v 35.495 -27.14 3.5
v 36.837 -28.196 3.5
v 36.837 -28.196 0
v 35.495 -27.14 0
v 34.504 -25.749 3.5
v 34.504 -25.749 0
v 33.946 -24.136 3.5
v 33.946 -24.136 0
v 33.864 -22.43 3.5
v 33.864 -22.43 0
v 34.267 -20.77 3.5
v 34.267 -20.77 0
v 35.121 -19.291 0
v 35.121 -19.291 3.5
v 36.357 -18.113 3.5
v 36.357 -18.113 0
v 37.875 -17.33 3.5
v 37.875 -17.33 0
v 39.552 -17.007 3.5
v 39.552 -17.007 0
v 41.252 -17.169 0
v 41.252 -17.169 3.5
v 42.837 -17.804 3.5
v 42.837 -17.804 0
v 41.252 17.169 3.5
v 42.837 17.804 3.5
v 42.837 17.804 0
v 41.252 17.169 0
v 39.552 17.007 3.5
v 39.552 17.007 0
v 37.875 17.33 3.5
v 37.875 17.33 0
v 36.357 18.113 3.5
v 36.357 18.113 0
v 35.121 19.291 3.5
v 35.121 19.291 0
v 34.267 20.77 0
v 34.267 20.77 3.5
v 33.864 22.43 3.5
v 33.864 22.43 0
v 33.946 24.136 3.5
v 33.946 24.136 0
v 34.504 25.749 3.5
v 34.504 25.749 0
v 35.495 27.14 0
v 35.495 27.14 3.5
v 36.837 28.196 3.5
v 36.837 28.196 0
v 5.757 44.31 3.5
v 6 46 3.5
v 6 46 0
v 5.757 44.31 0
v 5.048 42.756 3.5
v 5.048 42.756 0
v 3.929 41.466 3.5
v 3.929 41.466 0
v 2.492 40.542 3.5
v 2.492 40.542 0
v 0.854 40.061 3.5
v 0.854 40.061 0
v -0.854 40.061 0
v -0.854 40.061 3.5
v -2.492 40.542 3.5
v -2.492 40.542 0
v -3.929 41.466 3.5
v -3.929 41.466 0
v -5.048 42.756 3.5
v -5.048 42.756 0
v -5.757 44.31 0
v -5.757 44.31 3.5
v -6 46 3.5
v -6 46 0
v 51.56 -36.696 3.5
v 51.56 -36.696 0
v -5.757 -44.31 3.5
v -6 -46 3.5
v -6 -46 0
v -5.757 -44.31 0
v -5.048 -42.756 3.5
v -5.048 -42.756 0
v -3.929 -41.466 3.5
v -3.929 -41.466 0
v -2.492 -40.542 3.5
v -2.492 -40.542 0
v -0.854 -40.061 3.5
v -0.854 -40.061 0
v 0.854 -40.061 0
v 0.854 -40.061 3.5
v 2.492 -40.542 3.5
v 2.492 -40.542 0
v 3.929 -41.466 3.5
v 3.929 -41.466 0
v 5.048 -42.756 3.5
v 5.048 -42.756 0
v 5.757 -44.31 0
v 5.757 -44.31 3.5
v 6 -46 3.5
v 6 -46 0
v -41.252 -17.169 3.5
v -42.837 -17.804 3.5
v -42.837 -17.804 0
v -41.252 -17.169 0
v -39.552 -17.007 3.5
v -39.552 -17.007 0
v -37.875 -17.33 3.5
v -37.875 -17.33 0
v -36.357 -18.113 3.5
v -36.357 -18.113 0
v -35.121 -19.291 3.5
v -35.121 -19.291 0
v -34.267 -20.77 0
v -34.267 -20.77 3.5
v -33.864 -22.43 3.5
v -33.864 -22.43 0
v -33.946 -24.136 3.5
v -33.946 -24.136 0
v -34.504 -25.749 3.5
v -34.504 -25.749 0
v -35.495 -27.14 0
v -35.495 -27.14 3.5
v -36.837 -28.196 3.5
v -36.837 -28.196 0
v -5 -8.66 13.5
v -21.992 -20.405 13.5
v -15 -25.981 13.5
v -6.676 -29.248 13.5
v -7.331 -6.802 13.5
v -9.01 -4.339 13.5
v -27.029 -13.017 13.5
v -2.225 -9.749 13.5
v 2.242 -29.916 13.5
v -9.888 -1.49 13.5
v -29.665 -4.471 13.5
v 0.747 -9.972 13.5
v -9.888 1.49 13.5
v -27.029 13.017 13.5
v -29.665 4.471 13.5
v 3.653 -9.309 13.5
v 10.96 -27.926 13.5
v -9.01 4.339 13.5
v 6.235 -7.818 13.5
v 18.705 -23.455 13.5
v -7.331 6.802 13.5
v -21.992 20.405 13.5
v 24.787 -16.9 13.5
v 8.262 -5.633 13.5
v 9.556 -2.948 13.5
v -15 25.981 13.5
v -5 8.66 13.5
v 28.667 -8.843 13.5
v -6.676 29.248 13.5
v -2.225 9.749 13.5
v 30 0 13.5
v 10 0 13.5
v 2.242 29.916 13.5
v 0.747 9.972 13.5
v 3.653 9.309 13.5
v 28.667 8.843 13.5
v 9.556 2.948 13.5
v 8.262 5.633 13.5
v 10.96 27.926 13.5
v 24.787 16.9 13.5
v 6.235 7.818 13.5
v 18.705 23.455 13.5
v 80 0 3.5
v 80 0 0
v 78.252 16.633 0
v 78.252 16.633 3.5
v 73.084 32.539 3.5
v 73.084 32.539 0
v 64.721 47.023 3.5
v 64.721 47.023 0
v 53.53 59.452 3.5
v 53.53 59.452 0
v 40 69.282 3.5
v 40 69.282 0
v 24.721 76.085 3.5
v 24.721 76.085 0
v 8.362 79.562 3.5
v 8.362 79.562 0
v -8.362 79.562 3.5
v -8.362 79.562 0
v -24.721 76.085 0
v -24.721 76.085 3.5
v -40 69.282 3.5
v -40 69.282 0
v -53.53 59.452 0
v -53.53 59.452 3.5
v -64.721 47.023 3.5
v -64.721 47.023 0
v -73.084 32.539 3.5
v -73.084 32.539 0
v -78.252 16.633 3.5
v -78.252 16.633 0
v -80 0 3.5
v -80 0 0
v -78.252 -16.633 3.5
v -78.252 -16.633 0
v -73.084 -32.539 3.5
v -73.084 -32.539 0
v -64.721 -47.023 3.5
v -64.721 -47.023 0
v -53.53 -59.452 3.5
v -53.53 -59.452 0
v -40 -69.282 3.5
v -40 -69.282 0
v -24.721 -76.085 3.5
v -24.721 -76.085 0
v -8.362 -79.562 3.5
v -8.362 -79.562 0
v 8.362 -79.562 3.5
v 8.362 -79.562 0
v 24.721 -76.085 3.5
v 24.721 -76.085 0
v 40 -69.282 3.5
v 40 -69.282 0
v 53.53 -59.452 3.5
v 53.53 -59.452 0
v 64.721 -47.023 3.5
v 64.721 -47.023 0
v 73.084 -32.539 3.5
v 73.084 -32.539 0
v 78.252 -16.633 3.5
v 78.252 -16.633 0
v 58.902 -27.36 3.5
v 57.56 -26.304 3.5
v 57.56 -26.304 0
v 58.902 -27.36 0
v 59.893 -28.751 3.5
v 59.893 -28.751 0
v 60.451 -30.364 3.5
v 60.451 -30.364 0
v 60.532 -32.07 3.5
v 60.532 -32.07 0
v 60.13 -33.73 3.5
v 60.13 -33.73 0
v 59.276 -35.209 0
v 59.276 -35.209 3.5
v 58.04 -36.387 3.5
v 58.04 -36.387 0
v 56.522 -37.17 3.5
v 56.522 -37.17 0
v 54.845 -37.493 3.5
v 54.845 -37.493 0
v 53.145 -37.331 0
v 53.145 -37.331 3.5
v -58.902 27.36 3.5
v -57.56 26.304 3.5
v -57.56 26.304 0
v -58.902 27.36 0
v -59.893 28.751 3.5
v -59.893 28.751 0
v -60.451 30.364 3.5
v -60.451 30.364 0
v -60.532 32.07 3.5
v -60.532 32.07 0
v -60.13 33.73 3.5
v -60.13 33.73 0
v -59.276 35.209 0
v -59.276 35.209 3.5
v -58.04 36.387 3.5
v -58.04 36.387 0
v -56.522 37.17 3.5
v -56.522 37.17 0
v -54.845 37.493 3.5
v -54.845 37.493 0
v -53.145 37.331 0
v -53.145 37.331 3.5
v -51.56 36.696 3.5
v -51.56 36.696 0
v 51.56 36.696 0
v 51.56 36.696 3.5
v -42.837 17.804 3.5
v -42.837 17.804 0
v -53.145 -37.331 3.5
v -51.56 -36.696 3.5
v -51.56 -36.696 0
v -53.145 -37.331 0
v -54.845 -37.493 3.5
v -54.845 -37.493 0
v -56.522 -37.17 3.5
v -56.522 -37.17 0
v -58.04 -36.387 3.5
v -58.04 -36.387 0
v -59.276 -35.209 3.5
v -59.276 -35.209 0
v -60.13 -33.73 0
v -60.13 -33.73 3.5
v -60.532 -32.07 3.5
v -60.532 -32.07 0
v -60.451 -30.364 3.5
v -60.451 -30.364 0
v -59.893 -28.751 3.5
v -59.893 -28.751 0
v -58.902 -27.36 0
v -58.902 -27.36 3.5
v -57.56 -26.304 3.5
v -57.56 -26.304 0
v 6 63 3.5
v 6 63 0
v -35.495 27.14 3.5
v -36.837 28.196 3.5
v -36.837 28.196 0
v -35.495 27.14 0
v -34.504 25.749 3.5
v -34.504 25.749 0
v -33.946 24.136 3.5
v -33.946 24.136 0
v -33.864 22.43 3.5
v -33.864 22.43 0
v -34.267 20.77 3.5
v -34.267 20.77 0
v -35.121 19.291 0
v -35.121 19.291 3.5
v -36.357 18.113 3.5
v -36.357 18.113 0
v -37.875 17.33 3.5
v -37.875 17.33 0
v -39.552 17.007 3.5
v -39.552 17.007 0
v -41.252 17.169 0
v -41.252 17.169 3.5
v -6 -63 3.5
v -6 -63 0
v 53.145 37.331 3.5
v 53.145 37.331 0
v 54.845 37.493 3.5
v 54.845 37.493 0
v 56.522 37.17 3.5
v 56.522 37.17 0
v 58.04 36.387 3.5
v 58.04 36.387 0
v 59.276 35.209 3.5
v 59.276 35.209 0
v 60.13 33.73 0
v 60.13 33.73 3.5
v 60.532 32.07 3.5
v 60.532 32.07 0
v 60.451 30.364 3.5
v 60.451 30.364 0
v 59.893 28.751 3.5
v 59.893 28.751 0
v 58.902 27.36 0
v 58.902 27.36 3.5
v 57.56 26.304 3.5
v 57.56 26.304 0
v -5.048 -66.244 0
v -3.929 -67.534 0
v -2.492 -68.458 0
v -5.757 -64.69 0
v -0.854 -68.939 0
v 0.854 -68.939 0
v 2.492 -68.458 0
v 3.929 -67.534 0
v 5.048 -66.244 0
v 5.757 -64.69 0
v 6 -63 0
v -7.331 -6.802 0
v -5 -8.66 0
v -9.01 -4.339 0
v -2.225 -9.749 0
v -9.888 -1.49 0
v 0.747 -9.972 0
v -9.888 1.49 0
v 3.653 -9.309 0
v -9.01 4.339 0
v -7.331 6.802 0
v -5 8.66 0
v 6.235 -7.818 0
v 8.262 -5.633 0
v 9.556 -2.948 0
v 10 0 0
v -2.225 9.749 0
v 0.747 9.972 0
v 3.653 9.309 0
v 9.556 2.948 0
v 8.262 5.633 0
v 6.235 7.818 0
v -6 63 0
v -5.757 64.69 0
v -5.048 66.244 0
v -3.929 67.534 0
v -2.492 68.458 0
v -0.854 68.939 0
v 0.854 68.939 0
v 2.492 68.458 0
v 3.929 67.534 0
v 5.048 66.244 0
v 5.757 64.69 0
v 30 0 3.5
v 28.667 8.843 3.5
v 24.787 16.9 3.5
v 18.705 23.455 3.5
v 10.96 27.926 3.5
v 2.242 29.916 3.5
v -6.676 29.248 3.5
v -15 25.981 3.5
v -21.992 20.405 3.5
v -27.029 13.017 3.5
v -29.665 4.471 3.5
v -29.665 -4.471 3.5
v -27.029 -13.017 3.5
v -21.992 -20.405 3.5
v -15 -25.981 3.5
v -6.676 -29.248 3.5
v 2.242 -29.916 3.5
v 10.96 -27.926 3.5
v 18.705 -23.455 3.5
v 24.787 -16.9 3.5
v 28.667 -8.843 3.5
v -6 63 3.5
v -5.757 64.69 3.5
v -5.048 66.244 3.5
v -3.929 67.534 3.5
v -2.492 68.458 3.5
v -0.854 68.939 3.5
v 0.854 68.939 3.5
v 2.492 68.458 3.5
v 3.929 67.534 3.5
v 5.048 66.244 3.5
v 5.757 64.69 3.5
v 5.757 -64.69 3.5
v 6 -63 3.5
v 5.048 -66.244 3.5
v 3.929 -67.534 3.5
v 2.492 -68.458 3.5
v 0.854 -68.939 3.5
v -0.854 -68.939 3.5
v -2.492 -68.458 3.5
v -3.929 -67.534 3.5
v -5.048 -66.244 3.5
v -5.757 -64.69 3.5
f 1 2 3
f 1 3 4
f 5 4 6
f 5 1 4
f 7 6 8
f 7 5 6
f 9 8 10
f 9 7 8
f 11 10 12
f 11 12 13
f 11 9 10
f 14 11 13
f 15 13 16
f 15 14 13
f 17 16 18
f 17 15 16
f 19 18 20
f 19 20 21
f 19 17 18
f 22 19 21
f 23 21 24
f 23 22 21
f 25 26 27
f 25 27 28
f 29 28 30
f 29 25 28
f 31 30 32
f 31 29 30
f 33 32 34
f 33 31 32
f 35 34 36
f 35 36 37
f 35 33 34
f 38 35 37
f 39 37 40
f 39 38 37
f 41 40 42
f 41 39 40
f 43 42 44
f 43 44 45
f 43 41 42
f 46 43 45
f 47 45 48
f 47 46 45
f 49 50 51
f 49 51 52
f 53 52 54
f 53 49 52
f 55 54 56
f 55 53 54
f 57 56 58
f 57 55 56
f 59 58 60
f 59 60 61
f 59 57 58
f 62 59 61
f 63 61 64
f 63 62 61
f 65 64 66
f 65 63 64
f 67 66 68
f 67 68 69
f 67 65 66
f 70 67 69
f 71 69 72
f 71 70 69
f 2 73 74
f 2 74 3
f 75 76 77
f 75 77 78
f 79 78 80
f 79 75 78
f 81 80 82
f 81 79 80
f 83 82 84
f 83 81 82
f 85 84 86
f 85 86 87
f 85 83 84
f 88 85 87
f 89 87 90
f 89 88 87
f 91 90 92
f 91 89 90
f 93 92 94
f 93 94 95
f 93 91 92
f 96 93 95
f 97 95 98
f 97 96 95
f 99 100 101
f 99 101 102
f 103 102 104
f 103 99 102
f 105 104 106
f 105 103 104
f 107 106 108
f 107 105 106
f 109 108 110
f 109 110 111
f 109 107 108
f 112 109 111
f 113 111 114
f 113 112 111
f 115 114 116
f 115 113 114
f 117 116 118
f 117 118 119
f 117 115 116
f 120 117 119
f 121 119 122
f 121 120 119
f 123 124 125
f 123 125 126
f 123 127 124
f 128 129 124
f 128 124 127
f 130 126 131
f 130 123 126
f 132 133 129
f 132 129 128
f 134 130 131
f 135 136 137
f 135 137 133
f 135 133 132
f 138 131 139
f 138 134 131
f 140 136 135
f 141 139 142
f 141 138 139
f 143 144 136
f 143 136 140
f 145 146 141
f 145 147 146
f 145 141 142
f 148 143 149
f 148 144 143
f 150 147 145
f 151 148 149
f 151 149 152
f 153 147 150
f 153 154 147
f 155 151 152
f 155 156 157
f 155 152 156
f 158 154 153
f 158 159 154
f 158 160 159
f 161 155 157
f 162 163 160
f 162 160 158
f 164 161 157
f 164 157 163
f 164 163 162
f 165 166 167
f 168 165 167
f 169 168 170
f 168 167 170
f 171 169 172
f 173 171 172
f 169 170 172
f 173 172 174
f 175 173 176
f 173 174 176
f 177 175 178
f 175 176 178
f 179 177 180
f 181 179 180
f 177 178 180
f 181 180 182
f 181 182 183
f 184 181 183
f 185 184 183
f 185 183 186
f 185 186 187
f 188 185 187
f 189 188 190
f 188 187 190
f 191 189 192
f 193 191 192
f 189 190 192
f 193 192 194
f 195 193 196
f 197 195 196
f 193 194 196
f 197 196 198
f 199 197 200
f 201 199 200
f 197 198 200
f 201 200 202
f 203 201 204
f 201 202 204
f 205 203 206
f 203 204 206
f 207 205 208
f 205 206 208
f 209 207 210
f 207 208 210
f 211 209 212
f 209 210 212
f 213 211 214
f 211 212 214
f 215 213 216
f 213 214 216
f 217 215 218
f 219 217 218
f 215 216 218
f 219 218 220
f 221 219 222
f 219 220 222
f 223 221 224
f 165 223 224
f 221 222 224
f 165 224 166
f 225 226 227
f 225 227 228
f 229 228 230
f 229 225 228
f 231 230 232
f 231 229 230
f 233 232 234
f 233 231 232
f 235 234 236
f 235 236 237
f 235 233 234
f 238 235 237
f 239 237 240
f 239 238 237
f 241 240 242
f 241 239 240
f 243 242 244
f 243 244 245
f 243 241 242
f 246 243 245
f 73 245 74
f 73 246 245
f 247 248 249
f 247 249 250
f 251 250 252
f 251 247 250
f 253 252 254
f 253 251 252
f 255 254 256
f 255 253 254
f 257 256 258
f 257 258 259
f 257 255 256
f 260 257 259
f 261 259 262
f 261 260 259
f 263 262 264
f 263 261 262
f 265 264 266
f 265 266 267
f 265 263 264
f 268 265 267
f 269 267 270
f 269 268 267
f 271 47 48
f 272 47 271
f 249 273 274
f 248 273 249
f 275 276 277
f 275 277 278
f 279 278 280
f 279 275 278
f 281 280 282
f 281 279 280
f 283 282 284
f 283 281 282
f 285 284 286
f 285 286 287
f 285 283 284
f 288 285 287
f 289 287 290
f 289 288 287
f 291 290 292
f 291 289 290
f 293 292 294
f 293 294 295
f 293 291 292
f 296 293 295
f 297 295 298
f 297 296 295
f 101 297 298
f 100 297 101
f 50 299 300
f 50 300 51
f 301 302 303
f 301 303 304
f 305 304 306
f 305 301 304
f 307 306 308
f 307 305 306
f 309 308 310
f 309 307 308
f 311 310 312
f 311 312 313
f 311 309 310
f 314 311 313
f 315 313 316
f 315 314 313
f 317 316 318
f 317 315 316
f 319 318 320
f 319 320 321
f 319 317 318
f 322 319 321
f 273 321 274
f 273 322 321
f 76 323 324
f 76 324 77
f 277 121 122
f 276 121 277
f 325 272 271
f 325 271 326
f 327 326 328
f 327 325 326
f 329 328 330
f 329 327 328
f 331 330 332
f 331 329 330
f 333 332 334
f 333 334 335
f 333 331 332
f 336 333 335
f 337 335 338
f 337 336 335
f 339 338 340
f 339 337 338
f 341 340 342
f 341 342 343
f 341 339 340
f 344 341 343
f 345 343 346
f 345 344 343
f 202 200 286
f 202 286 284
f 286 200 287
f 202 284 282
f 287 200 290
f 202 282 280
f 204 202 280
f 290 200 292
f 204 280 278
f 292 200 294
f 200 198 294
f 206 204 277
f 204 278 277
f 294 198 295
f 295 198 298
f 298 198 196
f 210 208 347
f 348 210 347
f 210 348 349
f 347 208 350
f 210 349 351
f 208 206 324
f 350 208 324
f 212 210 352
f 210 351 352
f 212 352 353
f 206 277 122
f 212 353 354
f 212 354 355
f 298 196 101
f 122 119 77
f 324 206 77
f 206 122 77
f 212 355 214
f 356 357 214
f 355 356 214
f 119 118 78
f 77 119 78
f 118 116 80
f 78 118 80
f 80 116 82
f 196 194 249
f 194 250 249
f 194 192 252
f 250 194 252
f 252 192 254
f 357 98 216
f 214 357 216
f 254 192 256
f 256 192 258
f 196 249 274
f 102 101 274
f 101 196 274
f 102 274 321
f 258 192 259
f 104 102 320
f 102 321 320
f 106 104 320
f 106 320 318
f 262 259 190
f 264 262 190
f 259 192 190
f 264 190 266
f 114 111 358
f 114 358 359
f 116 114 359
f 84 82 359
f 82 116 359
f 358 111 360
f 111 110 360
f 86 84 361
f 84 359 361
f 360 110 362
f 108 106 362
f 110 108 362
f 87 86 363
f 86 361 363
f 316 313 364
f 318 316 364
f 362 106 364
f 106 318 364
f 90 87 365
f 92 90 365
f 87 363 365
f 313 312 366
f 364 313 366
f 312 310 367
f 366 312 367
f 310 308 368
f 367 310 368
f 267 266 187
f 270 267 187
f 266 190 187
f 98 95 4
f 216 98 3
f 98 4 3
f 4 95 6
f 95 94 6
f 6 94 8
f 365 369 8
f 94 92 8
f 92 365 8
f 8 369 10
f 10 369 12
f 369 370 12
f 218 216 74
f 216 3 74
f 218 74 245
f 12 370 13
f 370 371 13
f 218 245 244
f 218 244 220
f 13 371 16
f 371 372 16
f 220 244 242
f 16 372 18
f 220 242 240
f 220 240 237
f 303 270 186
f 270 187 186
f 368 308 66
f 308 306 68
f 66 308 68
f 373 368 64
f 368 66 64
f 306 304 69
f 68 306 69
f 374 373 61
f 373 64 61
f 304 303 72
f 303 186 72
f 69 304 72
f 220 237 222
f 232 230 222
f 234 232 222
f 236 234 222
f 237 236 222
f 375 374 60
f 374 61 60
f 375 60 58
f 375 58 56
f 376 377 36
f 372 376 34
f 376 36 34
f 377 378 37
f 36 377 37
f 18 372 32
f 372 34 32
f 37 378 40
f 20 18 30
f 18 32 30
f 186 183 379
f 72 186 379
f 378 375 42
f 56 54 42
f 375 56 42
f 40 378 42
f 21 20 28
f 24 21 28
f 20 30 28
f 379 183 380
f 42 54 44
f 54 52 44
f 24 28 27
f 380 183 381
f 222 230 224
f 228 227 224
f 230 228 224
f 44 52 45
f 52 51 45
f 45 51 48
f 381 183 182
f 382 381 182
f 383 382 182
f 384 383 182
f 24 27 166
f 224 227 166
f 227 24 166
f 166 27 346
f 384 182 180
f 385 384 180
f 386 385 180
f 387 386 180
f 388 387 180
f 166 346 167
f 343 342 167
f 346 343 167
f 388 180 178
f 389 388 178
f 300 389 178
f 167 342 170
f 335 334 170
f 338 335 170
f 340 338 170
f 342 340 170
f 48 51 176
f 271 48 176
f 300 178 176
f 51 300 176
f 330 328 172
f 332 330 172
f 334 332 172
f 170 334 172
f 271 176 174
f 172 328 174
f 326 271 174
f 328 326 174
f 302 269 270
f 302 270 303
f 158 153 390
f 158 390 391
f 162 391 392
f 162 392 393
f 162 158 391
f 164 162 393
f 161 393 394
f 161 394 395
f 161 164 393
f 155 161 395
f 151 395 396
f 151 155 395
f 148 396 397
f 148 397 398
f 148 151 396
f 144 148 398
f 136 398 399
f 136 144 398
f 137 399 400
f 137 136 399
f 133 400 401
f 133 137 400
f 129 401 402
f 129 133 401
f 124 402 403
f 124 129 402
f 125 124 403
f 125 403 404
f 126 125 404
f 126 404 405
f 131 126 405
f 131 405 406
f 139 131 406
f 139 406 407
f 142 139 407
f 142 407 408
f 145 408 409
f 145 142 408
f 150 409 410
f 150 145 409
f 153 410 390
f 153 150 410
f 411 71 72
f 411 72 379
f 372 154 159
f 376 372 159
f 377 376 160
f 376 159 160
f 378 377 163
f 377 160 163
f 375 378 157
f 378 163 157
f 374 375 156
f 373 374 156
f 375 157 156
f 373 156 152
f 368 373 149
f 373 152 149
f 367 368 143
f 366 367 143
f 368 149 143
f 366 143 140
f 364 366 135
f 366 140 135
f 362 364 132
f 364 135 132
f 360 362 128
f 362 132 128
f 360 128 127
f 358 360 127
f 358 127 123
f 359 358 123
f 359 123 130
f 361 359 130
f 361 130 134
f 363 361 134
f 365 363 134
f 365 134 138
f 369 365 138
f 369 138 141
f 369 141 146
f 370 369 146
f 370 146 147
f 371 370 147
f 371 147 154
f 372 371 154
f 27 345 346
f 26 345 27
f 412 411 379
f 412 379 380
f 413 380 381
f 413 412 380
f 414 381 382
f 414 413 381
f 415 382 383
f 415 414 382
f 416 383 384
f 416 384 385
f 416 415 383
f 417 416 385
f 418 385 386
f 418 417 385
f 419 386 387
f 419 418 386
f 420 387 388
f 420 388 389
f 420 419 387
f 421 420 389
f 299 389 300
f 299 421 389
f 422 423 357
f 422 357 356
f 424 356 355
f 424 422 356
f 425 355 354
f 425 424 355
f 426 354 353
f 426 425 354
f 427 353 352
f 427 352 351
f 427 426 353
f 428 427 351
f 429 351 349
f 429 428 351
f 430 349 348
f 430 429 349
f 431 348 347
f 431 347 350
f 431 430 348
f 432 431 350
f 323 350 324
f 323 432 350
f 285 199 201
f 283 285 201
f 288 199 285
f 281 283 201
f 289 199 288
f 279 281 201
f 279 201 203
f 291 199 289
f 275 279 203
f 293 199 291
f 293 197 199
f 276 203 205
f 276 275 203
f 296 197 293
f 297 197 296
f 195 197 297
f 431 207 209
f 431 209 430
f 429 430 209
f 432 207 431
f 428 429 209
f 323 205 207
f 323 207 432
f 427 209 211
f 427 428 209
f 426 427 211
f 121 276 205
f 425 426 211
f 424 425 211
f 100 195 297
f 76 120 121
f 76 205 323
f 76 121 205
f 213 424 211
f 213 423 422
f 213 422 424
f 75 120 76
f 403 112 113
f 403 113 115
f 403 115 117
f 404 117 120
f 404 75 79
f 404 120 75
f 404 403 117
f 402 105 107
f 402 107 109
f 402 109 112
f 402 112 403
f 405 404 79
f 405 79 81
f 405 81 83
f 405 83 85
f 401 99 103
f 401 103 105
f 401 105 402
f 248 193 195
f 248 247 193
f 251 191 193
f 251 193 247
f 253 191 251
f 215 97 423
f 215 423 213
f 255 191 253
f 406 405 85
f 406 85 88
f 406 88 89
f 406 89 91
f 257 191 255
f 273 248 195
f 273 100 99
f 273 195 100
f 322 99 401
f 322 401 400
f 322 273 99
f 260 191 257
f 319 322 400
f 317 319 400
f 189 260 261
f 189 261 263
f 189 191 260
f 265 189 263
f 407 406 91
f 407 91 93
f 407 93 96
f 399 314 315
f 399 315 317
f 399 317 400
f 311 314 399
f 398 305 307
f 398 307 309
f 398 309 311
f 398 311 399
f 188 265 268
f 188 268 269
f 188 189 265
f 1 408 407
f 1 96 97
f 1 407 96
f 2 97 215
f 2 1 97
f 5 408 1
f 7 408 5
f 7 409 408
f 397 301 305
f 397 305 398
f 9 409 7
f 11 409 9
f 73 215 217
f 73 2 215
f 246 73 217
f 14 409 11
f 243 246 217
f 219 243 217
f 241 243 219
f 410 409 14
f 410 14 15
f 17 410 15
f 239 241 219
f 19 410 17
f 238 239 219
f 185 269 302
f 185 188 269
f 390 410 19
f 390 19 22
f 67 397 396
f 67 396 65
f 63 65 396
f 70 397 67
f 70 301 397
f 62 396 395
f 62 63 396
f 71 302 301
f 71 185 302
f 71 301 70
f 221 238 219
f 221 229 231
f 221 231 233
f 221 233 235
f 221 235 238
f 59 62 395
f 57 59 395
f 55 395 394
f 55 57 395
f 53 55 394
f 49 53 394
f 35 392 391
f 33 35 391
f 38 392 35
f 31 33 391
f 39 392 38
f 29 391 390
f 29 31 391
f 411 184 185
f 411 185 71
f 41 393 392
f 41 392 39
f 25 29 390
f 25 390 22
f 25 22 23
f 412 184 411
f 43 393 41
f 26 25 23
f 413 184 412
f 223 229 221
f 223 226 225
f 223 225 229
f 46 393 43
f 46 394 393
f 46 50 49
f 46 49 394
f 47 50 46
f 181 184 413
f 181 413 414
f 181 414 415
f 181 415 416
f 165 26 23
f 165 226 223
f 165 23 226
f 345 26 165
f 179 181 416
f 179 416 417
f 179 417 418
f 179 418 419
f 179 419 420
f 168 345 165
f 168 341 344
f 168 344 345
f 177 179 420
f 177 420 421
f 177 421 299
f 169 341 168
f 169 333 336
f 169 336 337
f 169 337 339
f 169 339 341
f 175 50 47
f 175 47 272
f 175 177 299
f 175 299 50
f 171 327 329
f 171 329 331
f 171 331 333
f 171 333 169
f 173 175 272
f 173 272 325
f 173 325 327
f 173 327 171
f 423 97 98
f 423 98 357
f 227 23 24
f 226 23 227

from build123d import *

# Parameters (mm, degrees)
SKETCH1_R           = 80
BOSS_EXTRUDE1_DEPTH = 3.5
SKETCH2_R           = 10
CUT_EXTRUDE1_DEPTH  = 3.5
BOSS_EXTRUDE2_START = 10
SKETCH3_R           = 30
SKETCH3_R_2         = 10
BOSS_EXTRUDE2_DEPTH = 10
CUT_EXTRUDE2_DEPTH  = 3.5


with BuildPart() as part:
    # Sketch1 → Boss-Extrude1 (new body)
    with BuildSketch(Plane.XY):
        Circle(SKETCH1_R)
    extrude(amount=BOSS_EXTRUDE1_DEPTH)

    # Sketch2 → Cut-Extrude1 (cut)
    with BuildSketch(Plane.XY.offset(3.5)):
        Circle(SKETCH2_R)
    extrude(amount=-CUT_EXTRUDE1_DEPTH, mode=Mode.SUBTRACT)

    # Sketch3 → Boss-Extrude2 (add)
    with BuildSketch(Plane.XY.offset(3.5).offset(BOSS_EXTRUDE2_START)):
        Circle(SKETCH3_R)
        Circle(SKETCH3_R_2, mode=Mode.SUBTRACT)
    extrude(amount=-BOSS_EXTRUDE2_DEPTH)

    # Sketch6 → Cut-Extrude2 (cut)
    with BuildSketch(Plane.XY.offset(3.5)):
        with BuildLine():
            Line((36.837168574, 28.196152423), (51.559600438, 36.696152423))
            ThreePointArc((51.559600438, 36.696152423), (59.755752861, 34.5), (57.559600438, 26.303847577))
            Line((57.559600438, 26.303847577), (42.837168574, 17.803847577))
            ThreePointArc((42.837168574, 17.803847577), (34.641016151, 20), (36.837168574, 28.196152423))
        make_face()
        with BuildLine():
            Line((42.837168574, -17.803847577), (57.559600438, -26.303847577))
            ThreePointArc((57.559600438, -26.303847577), (59.755752861, -34.5), (51.559600438, -36.696152423))
            Line((51.559600438, -36.696152423), (36.837168574, -28.196152423))
            ThreePointArc((36.837168574, -28.196152423), (34.641016151, -20), (42.837168574, -17.803847577))
        make_face()
        with BuildLine():
            Line((6, -46), (6, -63))
            ThreePointArc((6, -63), (0, -69), (-6, -63))
            Line((-6, -63), (-6, -46))
            ThreePointArc((-6, -46), (0, -40), (6, -46))
        make_face()
        with BuildLine():
            Line((-36.837168574, -28.196152423), (-51.559600438, -36.696152423))
            ThreePointArc((-51.559600438, -36.696152423), (-59.755752861, -34.5), (-57.559600438, -26.303847577))
            Line((-57.559600438, -26.303847577), (-42.837168574, -17.803847577))
            ThreePointArc((-42.837168574, -17.803847577), (-34.641016151, -20), (-36.837168574, -28.196152423))
        make_face()
        with BuildLine():
            Line((-42.837168574, 17.803847577), (-57.559600438, 26.303847577))
            ThreePointArc((-57.559600438, 26.303847577), (-59.755752861, 34.5), (-51.559600438, 36.696152423))
            Line((-51.559600438, 36.696152423), (-36.837168574, 28.196152423))
            ThreePointArc((-36.837168574, 28.196152423), (-34.641016151, 20), (-42.837168574, 17.803847577))
        make_face()
        with BuildLine():
            Line((-6, 46), (-6, 63))
            ThreePointArc((-6, 63), (0, 69), (6, 63))
            Line((6, 63), (6, 46))
            ThreePointArc((6, 46), (0, 40), (-6, 46))
        make_face()
    extrude(amount=-CUT_EXTRUDE2_DEPTH, mode=Mode.SUBTRACT)


solid = part.part
